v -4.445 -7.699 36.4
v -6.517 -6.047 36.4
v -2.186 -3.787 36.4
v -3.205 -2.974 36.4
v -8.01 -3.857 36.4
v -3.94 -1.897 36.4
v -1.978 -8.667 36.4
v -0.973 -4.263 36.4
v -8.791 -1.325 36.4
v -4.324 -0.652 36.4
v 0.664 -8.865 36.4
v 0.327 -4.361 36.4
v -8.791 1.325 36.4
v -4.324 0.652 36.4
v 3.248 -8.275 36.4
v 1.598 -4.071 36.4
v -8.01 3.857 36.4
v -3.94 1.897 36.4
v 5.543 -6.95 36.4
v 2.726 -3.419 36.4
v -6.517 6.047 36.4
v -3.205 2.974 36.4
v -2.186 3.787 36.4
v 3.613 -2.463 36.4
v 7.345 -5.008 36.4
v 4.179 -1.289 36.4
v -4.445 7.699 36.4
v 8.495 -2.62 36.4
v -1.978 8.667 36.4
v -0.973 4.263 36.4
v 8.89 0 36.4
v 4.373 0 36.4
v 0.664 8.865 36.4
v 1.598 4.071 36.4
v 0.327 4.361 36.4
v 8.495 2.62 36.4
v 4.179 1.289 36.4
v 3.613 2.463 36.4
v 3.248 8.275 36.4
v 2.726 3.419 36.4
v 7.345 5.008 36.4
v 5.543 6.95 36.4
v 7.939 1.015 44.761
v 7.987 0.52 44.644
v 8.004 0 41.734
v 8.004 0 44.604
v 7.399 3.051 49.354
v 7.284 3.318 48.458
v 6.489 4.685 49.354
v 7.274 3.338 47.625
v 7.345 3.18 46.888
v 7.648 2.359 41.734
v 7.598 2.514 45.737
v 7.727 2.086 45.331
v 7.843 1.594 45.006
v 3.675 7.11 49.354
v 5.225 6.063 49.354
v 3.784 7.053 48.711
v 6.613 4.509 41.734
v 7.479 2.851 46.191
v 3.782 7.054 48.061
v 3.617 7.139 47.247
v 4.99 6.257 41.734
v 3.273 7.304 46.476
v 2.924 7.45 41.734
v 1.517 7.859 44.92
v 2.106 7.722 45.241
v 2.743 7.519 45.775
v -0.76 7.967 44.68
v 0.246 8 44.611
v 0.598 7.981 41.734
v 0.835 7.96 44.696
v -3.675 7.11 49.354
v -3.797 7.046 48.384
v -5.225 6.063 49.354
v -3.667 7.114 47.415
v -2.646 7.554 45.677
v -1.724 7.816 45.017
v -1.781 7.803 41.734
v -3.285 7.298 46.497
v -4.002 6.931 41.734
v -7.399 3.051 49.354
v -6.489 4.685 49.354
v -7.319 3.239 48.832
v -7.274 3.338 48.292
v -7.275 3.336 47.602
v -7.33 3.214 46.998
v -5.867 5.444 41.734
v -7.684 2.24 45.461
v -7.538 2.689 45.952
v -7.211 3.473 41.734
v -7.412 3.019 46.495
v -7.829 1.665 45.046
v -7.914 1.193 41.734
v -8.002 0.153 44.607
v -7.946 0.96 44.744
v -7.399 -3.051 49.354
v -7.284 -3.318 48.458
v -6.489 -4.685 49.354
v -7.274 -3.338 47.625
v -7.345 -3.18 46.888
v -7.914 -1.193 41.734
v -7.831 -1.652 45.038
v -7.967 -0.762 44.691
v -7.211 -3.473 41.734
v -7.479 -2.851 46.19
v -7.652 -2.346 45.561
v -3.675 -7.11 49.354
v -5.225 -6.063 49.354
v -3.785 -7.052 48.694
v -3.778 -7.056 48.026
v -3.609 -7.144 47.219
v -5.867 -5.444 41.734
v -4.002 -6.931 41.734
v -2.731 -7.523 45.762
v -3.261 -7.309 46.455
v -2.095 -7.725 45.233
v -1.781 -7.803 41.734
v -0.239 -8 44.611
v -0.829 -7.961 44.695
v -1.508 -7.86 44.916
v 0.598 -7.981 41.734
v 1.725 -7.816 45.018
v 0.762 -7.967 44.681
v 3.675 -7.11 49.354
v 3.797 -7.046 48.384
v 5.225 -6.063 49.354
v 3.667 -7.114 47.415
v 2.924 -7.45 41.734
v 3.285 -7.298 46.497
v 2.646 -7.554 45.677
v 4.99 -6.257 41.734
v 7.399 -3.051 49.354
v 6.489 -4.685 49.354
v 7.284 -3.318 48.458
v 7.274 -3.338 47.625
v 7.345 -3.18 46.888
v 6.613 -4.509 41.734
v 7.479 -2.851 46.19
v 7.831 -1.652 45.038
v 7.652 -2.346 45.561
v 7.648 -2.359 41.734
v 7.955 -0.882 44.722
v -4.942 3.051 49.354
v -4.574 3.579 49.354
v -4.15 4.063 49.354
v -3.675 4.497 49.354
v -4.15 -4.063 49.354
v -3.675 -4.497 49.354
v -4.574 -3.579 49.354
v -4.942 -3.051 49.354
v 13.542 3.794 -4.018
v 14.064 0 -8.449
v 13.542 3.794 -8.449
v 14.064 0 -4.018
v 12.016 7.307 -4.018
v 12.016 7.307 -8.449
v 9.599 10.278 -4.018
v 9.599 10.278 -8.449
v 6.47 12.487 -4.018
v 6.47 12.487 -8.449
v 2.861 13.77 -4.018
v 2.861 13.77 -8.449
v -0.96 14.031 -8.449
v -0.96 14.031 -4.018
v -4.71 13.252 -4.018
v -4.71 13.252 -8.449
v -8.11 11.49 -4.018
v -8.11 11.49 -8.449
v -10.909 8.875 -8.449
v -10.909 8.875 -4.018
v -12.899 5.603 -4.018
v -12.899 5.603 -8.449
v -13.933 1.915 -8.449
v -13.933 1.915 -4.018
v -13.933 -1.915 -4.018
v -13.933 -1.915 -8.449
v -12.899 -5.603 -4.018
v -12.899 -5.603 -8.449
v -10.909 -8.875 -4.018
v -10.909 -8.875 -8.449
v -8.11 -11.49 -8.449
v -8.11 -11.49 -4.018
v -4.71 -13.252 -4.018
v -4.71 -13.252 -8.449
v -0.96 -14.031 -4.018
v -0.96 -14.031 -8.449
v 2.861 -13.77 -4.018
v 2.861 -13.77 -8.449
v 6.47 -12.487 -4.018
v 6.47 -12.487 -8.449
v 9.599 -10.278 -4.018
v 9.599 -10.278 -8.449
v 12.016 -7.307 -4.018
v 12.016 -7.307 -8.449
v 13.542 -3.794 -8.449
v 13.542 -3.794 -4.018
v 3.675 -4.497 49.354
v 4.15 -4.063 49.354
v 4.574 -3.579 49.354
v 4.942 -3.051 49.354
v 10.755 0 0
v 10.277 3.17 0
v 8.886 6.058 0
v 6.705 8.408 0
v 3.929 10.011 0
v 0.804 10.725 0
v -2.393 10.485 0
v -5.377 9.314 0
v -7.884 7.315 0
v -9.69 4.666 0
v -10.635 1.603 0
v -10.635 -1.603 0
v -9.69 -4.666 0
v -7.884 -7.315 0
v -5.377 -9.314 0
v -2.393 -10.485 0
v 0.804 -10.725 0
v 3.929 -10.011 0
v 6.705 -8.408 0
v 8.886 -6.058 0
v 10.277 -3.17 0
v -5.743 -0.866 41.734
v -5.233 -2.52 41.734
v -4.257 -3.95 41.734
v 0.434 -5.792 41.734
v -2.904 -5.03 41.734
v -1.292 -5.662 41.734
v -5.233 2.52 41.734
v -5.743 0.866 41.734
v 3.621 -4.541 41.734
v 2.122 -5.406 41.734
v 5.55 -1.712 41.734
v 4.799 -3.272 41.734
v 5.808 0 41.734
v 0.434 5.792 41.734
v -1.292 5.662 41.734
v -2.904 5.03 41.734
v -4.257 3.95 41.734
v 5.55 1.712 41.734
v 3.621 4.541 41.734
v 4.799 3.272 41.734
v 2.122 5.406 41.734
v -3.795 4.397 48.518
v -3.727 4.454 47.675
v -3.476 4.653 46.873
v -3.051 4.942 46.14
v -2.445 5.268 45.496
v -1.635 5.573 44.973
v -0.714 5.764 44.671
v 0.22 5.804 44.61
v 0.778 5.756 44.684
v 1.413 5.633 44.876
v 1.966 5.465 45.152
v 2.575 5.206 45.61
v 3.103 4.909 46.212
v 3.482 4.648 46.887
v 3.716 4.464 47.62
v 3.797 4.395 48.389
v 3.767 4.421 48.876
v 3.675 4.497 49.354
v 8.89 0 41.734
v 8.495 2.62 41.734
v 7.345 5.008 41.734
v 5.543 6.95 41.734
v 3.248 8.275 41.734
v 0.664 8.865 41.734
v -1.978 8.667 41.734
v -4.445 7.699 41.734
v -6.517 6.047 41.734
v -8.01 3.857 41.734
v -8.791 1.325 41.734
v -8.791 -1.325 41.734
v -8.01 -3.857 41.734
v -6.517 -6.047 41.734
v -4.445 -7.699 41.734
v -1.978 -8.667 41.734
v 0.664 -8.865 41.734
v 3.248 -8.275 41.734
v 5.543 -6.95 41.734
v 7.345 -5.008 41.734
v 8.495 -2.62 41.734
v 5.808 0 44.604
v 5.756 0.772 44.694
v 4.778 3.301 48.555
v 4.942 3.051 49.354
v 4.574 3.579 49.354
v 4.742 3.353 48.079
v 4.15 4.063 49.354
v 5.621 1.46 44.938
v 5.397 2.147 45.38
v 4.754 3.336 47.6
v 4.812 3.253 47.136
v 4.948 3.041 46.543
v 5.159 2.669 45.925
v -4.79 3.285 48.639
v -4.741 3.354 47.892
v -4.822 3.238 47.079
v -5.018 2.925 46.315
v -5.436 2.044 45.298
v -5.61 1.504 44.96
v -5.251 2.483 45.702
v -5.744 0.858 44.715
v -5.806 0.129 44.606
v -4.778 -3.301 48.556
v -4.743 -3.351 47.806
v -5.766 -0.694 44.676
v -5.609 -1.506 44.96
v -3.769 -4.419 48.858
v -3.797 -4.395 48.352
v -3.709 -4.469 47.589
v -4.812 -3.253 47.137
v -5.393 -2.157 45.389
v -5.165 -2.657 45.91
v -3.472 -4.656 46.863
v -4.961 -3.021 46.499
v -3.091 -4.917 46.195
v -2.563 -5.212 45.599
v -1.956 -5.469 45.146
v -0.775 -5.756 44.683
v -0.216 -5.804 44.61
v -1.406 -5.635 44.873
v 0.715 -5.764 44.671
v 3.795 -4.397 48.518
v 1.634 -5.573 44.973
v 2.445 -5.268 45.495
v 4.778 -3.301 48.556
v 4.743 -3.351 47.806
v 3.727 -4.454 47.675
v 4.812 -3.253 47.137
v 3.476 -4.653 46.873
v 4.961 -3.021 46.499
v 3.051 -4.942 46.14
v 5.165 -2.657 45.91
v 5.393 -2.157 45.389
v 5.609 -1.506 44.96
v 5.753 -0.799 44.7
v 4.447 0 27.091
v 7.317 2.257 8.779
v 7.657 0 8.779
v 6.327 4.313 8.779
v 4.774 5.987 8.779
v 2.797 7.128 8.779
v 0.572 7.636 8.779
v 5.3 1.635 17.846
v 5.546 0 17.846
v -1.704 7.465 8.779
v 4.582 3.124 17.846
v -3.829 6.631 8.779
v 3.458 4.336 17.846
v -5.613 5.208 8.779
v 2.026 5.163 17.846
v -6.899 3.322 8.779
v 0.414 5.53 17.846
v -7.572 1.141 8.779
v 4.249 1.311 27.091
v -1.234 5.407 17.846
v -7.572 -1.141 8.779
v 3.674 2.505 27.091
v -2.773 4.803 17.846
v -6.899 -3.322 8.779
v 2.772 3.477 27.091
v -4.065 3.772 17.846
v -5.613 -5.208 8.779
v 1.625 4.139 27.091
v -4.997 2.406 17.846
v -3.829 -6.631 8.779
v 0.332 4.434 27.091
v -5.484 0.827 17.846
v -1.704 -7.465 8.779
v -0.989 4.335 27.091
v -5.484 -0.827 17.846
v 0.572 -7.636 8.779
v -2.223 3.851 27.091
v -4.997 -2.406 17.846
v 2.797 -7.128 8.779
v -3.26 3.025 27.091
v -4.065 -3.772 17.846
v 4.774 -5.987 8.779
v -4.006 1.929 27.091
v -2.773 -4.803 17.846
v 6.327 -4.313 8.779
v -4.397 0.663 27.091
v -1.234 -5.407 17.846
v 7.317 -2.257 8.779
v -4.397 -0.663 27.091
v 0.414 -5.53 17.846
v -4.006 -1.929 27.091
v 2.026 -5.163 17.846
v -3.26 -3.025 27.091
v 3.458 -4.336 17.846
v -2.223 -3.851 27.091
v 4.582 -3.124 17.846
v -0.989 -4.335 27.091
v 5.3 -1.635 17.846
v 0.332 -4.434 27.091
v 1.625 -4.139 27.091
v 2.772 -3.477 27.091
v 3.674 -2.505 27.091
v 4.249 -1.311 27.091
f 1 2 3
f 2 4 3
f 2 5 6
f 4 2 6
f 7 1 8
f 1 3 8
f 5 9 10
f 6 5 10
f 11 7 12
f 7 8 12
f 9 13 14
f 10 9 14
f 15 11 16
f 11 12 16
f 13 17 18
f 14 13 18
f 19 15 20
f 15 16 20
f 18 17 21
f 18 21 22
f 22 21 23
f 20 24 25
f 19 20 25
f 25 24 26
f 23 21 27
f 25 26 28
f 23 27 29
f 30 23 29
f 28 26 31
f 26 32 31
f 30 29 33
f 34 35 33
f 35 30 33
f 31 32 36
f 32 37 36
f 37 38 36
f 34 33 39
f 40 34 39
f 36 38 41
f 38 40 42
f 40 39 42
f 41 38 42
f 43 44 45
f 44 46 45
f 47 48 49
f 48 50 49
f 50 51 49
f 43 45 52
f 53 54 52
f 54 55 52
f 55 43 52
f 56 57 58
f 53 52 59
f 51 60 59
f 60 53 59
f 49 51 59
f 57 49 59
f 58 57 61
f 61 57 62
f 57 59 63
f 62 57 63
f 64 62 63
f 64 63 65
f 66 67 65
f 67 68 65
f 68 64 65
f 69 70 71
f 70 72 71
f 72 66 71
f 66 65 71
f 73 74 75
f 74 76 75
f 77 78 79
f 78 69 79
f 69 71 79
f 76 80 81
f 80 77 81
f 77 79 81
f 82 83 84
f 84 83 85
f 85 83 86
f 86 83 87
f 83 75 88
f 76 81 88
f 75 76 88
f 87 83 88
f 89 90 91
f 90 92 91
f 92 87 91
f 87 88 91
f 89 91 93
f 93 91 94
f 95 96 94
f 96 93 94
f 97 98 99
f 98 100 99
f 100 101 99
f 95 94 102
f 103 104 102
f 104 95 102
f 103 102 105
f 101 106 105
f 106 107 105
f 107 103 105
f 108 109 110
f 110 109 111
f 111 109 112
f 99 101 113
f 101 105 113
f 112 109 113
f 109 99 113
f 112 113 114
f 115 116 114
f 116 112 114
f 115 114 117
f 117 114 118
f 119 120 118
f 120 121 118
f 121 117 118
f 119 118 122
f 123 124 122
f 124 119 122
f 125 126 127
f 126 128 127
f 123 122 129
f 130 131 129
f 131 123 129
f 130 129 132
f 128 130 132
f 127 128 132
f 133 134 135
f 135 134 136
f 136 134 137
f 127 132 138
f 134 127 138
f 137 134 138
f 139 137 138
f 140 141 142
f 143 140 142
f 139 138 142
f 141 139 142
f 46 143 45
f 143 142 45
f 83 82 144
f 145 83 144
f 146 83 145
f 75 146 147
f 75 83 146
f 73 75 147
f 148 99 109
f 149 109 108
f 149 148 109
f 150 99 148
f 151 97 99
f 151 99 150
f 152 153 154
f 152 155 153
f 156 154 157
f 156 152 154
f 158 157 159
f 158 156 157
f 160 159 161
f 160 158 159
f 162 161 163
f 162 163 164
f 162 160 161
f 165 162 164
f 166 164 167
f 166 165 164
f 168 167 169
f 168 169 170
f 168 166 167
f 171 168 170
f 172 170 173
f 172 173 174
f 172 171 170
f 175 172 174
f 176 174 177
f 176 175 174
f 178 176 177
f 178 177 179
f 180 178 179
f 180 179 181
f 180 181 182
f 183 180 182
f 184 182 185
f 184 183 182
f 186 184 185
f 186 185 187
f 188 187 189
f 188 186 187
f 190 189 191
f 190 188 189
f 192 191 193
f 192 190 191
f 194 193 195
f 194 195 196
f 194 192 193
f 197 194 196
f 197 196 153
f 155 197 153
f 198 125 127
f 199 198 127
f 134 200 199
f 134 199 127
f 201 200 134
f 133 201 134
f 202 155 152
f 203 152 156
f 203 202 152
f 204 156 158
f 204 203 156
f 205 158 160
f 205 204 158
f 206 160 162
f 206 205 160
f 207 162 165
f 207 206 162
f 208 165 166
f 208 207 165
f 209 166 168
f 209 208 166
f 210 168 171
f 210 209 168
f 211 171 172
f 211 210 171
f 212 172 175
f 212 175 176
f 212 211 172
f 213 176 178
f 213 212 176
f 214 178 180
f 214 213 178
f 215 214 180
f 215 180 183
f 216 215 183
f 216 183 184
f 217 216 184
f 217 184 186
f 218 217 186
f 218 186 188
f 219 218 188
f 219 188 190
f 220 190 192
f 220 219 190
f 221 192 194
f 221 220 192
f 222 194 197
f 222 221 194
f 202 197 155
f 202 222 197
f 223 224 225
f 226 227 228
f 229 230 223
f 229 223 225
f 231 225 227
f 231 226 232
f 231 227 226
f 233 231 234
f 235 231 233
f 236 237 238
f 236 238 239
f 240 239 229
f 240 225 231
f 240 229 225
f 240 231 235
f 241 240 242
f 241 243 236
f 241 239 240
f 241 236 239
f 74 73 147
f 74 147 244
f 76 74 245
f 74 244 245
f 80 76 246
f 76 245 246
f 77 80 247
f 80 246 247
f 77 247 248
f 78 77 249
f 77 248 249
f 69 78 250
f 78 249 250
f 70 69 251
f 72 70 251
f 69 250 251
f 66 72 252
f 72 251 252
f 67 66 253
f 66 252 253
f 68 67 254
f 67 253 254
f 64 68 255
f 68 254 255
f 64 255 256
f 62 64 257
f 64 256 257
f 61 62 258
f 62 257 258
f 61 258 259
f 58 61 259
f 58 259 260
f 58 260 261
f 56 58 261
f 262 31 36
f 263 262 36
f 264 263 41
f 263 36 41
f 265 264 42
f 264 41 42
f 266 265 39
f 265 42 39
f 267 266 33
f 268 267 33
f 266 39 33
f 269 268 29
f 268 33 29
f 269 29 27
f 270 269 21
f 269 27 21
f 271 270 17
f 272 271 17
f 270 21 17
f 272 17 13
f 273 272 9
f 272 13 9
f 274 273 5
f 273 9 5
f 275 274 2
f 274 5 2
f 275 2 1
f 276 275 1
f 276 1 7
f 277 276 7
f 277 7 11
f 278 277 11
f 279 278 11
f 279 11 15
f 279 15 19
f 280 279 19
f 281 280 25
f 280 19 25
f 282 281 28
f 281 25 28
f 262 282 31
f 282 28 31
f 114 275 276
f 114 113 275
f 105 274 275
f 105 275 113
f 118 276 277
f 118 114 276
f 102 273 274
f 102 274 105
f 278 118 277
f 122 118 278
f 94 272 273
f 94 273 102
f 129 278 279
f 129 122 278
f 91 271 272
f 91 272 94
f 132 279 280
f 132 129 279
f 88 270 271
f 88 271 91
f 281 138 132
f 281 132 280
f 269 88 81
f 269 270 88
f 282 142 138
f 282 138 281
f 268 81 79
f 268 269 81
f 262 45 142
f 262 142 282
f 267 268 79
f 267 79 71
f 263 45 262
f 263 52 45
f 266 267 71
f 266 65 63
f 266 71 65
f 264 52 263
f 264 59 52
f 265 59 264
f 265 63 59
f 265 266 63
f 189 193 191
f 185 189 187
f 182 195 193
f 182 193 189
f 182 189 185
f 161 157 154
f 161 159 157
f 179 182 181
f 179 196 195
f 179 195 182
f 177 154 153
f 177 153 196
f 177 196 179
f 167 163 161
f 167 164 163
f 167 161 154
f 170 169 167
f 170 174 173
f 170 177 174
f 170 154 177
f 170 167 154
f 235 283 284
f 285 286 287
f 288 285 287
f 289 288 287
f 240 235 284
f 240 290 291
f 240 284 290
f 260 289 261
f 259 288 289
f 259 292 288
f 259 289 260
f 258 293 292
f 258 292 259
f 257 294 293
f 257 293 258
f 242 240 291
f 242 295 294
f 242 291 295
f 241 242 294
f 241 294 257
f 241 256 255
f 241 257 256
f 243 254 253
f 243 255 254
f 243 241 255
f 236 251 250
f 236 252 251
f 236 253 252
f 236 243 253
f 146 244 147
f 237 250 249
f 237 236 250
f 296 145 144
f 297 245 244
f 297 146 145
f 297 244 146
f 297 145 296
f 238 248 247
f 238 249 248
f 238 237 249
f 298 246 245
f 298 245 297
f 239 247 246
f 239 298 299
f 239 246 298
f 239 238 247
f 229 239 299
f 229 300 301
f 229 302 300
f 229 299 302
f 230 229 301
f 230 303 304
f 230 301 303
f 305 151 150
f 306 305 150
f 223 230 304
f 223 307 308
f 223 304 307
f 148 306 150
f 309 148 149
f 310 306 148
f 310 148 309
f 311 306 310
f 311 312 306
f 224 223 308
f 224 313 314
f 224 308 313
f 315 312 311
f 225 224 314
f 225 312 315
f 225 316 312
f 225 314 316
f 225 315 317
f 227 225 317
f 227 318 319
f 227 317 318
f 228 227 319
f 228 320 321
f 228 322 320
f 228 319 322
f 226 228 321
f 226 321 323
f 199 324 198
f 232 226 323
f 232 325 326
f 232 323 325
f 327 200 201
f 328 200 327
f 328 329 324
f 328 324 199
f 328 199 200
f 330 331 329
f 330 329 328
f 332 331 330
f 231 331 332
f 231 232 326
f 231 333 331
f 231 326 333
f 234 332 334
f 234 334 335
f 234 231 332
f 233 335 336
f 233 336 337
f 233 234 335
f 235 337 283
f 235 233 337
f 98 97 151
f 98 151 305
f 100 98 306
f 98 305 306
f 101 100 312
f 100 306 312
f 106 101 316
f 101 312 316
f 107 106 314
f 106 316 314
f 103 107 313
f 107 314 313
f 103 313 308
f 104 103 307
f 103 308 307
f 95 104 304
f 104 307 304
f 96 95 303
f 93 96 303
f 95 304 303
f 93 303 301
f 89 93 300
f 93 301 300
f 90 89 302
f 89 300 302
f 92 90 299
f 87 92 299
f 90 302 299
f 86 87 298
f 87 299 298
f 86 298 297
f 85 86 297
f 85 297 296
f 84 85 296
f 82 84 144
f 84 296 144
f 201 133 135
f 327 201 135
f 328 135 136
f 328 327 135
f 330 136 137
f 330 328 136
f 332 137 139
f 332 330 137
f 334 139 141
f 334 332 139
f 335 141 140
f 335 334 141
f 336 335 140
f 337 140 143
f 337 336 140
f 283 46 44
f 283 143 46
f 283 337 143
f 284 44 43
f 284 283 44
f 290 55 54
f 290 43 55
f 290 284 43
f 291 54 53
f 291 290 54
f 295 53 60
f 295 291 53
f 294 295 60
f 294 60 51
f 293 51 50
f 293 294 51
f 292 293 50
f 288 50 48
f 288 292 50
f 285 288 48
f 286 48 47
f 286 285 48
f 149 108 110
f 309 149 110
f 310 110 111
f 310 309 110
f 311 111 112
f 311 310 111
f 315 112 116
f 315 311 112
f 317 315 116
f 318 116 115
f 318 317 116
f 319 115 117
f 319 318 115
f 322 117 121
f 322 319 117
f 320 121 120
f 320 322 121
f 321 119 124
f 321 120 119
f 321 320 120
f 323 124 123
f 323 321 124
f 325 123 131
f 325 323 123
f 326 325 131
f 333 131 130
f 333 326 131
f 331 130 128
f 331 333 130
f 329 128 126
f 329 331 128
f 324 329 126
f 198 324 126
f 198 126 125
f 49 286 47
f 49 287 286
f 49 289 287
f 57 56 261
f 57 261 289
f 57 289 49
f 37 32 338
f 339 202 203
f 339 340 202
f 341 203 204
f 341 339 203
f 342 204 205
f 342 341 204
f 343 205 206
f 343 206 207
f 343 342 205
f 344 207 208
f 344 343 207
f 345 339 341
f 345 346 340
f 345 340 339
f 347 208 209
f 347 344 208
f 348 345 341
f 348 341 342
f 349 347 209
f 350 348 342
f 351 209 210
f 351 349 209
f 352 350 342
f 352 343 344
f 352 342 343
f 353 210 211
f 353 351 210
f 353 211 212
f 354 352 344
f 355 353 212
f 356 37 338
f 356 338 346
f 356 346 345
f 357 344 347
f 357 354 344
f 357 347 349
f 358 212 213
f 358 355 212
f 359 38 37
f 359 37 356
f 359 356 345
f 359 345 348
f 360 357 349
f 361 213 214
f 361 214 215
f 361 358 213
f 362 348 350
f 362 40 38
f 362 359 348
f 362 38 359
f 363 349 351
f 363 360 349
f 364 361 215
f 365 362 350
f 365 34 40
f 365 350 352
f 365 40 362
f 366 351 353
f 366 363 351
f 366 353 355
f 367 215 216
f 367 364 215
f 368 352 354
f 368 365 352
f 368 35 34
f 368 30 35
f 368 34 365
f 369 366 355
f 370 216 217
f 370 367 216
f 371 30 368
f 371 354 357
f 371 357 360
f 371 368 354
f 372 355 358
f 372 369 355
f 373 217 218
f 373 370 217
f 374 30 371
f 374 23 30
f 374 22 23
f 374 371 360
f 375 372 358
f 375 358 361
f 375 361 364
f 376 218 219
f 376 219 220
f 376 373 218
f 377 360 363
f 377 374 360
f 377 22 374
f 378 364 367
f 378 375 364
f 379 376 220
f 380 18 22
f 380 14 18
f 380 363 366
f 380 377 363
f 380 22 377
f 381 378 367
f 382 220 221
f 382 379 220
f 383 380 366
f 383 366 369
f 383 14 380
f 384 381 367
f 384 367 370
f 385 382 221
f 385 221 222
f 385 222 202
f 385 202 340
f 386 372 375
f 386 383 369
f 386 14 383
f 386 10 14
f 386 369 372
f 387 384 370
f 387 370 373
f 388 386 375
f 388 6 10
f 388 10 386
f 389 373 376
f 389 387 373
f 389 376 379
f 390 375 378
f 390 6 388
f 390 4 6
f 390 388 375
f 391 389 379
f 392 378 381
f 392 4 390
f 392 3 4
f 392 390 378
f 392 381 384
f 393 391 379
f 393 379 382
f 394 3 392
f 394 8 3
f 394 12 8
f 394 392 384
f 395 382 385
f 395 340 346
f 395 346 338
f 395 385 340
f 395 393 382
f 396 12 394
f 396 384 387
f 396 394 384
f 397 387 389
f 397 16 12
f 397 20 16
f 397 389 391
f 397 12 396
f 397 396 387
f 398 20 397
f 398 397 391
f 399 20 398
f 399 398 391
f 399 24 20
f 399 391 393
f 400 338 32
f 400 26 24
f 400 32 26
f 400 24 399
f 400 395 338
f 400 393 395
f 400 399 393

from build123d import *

# Parameters (mm, degrees)
F2_W      = 14.063794
F2_H      = 1.89093
F2_H_2    = 2.54
F4_R      = 8.89
F5_DEPTH  = 5.334
F6_R      = 8.003634
F6_R_2    = 5.807909
F7_DEPTH  = 7.62
F8_R      = 3.79686
F9_DEPTH  = 25.4
F10_DEPTH = 98.552
F11_R     = 3.354898
F12_DEPTH = 25.4
F13_DEPTH = 156.972


with BuildPart() as f1:
    # F0 (on Front) → F1 (revolve)
    with BuildSketch(Plane.XZ):
        with BuildLine():
            Line((0, 36.400415), (0, 0))
            Line((0, 0), (10.754668, 0))
            ThreePointArc((10.754668, 0), (5.545952, 17.846443), (4.372776, 36.400415))
            Line((4.372776, 36.400415), (0, 36.400415))
        make_face()
    revolve(axis=Axis((0, 0, 22.225), (0, 0, 1)))

    # F2 (on Front) → F3 (revolve)
    with BuildSketch(Plane.XZ):
        Polygon((10.754665, 0), (0, 0), (0, -4.018228), (14.063794, -4.018228), align=None)
        with Locations((7.031897, -4.963693)):
            Rectangle(F2_W, F2_H)
        with Locations((7.031897, -7.179158)):
            Rectangle(F2_W, F2_H_2)
    revolve(axis=Axis((0, 0, -4.963693), (0, 0, 1)))

    # F4 (on face) → F5 (join)
    with BuildSketch(Plane.XY.offset(36.400415)):
        Circle(F4_R)
    extrude(amount=F5_DEPTH)

    # F6 (on face) → F7 (join)
    with BuildSketch(Plane.XY.offset(41.734415)):
        Circle(F6_R)
        Circle(F6_R_2, mode=Mode.SUBTRACT)
    extrude(amount=F7_DEPTH)

    # F8 (on Front) → F9 (cut)
    with BuildSketch(Plane.XZ):
        with Locations((0, 48.400268)):
            Circle(F8_R)
    extrude(amount=-F9_DEPTH, mode=Mode.SUBTRACT)

    # F8 (on Front) → F10 (cut)
    with BuildSketch(Plane.XZ):
        with Locations((0, 48.400268)):
            Circle(F8_R)
    extrude(amount=F10_DEPTH, mode=Mode.SUBTRACT)

    # F11 (on Right) → F12 (cut)
    with BuildSketch(Plane.YZ):
        with Locations((0, 47.958534)):
            Circle(F11_R)
    extrude(amount=-F12_DEPTH, mode=Mode.SUBTRACT)

    # F11 (on Right) → F13 (cut)
    with BuildSketch(Plane.YZ):
        with Locations((0, 47.958534)):
            Circle(F11_R)
    extrude(amount=F13_DEPTH, mode=Mode.SUBTRACT)


solid = f1.part
